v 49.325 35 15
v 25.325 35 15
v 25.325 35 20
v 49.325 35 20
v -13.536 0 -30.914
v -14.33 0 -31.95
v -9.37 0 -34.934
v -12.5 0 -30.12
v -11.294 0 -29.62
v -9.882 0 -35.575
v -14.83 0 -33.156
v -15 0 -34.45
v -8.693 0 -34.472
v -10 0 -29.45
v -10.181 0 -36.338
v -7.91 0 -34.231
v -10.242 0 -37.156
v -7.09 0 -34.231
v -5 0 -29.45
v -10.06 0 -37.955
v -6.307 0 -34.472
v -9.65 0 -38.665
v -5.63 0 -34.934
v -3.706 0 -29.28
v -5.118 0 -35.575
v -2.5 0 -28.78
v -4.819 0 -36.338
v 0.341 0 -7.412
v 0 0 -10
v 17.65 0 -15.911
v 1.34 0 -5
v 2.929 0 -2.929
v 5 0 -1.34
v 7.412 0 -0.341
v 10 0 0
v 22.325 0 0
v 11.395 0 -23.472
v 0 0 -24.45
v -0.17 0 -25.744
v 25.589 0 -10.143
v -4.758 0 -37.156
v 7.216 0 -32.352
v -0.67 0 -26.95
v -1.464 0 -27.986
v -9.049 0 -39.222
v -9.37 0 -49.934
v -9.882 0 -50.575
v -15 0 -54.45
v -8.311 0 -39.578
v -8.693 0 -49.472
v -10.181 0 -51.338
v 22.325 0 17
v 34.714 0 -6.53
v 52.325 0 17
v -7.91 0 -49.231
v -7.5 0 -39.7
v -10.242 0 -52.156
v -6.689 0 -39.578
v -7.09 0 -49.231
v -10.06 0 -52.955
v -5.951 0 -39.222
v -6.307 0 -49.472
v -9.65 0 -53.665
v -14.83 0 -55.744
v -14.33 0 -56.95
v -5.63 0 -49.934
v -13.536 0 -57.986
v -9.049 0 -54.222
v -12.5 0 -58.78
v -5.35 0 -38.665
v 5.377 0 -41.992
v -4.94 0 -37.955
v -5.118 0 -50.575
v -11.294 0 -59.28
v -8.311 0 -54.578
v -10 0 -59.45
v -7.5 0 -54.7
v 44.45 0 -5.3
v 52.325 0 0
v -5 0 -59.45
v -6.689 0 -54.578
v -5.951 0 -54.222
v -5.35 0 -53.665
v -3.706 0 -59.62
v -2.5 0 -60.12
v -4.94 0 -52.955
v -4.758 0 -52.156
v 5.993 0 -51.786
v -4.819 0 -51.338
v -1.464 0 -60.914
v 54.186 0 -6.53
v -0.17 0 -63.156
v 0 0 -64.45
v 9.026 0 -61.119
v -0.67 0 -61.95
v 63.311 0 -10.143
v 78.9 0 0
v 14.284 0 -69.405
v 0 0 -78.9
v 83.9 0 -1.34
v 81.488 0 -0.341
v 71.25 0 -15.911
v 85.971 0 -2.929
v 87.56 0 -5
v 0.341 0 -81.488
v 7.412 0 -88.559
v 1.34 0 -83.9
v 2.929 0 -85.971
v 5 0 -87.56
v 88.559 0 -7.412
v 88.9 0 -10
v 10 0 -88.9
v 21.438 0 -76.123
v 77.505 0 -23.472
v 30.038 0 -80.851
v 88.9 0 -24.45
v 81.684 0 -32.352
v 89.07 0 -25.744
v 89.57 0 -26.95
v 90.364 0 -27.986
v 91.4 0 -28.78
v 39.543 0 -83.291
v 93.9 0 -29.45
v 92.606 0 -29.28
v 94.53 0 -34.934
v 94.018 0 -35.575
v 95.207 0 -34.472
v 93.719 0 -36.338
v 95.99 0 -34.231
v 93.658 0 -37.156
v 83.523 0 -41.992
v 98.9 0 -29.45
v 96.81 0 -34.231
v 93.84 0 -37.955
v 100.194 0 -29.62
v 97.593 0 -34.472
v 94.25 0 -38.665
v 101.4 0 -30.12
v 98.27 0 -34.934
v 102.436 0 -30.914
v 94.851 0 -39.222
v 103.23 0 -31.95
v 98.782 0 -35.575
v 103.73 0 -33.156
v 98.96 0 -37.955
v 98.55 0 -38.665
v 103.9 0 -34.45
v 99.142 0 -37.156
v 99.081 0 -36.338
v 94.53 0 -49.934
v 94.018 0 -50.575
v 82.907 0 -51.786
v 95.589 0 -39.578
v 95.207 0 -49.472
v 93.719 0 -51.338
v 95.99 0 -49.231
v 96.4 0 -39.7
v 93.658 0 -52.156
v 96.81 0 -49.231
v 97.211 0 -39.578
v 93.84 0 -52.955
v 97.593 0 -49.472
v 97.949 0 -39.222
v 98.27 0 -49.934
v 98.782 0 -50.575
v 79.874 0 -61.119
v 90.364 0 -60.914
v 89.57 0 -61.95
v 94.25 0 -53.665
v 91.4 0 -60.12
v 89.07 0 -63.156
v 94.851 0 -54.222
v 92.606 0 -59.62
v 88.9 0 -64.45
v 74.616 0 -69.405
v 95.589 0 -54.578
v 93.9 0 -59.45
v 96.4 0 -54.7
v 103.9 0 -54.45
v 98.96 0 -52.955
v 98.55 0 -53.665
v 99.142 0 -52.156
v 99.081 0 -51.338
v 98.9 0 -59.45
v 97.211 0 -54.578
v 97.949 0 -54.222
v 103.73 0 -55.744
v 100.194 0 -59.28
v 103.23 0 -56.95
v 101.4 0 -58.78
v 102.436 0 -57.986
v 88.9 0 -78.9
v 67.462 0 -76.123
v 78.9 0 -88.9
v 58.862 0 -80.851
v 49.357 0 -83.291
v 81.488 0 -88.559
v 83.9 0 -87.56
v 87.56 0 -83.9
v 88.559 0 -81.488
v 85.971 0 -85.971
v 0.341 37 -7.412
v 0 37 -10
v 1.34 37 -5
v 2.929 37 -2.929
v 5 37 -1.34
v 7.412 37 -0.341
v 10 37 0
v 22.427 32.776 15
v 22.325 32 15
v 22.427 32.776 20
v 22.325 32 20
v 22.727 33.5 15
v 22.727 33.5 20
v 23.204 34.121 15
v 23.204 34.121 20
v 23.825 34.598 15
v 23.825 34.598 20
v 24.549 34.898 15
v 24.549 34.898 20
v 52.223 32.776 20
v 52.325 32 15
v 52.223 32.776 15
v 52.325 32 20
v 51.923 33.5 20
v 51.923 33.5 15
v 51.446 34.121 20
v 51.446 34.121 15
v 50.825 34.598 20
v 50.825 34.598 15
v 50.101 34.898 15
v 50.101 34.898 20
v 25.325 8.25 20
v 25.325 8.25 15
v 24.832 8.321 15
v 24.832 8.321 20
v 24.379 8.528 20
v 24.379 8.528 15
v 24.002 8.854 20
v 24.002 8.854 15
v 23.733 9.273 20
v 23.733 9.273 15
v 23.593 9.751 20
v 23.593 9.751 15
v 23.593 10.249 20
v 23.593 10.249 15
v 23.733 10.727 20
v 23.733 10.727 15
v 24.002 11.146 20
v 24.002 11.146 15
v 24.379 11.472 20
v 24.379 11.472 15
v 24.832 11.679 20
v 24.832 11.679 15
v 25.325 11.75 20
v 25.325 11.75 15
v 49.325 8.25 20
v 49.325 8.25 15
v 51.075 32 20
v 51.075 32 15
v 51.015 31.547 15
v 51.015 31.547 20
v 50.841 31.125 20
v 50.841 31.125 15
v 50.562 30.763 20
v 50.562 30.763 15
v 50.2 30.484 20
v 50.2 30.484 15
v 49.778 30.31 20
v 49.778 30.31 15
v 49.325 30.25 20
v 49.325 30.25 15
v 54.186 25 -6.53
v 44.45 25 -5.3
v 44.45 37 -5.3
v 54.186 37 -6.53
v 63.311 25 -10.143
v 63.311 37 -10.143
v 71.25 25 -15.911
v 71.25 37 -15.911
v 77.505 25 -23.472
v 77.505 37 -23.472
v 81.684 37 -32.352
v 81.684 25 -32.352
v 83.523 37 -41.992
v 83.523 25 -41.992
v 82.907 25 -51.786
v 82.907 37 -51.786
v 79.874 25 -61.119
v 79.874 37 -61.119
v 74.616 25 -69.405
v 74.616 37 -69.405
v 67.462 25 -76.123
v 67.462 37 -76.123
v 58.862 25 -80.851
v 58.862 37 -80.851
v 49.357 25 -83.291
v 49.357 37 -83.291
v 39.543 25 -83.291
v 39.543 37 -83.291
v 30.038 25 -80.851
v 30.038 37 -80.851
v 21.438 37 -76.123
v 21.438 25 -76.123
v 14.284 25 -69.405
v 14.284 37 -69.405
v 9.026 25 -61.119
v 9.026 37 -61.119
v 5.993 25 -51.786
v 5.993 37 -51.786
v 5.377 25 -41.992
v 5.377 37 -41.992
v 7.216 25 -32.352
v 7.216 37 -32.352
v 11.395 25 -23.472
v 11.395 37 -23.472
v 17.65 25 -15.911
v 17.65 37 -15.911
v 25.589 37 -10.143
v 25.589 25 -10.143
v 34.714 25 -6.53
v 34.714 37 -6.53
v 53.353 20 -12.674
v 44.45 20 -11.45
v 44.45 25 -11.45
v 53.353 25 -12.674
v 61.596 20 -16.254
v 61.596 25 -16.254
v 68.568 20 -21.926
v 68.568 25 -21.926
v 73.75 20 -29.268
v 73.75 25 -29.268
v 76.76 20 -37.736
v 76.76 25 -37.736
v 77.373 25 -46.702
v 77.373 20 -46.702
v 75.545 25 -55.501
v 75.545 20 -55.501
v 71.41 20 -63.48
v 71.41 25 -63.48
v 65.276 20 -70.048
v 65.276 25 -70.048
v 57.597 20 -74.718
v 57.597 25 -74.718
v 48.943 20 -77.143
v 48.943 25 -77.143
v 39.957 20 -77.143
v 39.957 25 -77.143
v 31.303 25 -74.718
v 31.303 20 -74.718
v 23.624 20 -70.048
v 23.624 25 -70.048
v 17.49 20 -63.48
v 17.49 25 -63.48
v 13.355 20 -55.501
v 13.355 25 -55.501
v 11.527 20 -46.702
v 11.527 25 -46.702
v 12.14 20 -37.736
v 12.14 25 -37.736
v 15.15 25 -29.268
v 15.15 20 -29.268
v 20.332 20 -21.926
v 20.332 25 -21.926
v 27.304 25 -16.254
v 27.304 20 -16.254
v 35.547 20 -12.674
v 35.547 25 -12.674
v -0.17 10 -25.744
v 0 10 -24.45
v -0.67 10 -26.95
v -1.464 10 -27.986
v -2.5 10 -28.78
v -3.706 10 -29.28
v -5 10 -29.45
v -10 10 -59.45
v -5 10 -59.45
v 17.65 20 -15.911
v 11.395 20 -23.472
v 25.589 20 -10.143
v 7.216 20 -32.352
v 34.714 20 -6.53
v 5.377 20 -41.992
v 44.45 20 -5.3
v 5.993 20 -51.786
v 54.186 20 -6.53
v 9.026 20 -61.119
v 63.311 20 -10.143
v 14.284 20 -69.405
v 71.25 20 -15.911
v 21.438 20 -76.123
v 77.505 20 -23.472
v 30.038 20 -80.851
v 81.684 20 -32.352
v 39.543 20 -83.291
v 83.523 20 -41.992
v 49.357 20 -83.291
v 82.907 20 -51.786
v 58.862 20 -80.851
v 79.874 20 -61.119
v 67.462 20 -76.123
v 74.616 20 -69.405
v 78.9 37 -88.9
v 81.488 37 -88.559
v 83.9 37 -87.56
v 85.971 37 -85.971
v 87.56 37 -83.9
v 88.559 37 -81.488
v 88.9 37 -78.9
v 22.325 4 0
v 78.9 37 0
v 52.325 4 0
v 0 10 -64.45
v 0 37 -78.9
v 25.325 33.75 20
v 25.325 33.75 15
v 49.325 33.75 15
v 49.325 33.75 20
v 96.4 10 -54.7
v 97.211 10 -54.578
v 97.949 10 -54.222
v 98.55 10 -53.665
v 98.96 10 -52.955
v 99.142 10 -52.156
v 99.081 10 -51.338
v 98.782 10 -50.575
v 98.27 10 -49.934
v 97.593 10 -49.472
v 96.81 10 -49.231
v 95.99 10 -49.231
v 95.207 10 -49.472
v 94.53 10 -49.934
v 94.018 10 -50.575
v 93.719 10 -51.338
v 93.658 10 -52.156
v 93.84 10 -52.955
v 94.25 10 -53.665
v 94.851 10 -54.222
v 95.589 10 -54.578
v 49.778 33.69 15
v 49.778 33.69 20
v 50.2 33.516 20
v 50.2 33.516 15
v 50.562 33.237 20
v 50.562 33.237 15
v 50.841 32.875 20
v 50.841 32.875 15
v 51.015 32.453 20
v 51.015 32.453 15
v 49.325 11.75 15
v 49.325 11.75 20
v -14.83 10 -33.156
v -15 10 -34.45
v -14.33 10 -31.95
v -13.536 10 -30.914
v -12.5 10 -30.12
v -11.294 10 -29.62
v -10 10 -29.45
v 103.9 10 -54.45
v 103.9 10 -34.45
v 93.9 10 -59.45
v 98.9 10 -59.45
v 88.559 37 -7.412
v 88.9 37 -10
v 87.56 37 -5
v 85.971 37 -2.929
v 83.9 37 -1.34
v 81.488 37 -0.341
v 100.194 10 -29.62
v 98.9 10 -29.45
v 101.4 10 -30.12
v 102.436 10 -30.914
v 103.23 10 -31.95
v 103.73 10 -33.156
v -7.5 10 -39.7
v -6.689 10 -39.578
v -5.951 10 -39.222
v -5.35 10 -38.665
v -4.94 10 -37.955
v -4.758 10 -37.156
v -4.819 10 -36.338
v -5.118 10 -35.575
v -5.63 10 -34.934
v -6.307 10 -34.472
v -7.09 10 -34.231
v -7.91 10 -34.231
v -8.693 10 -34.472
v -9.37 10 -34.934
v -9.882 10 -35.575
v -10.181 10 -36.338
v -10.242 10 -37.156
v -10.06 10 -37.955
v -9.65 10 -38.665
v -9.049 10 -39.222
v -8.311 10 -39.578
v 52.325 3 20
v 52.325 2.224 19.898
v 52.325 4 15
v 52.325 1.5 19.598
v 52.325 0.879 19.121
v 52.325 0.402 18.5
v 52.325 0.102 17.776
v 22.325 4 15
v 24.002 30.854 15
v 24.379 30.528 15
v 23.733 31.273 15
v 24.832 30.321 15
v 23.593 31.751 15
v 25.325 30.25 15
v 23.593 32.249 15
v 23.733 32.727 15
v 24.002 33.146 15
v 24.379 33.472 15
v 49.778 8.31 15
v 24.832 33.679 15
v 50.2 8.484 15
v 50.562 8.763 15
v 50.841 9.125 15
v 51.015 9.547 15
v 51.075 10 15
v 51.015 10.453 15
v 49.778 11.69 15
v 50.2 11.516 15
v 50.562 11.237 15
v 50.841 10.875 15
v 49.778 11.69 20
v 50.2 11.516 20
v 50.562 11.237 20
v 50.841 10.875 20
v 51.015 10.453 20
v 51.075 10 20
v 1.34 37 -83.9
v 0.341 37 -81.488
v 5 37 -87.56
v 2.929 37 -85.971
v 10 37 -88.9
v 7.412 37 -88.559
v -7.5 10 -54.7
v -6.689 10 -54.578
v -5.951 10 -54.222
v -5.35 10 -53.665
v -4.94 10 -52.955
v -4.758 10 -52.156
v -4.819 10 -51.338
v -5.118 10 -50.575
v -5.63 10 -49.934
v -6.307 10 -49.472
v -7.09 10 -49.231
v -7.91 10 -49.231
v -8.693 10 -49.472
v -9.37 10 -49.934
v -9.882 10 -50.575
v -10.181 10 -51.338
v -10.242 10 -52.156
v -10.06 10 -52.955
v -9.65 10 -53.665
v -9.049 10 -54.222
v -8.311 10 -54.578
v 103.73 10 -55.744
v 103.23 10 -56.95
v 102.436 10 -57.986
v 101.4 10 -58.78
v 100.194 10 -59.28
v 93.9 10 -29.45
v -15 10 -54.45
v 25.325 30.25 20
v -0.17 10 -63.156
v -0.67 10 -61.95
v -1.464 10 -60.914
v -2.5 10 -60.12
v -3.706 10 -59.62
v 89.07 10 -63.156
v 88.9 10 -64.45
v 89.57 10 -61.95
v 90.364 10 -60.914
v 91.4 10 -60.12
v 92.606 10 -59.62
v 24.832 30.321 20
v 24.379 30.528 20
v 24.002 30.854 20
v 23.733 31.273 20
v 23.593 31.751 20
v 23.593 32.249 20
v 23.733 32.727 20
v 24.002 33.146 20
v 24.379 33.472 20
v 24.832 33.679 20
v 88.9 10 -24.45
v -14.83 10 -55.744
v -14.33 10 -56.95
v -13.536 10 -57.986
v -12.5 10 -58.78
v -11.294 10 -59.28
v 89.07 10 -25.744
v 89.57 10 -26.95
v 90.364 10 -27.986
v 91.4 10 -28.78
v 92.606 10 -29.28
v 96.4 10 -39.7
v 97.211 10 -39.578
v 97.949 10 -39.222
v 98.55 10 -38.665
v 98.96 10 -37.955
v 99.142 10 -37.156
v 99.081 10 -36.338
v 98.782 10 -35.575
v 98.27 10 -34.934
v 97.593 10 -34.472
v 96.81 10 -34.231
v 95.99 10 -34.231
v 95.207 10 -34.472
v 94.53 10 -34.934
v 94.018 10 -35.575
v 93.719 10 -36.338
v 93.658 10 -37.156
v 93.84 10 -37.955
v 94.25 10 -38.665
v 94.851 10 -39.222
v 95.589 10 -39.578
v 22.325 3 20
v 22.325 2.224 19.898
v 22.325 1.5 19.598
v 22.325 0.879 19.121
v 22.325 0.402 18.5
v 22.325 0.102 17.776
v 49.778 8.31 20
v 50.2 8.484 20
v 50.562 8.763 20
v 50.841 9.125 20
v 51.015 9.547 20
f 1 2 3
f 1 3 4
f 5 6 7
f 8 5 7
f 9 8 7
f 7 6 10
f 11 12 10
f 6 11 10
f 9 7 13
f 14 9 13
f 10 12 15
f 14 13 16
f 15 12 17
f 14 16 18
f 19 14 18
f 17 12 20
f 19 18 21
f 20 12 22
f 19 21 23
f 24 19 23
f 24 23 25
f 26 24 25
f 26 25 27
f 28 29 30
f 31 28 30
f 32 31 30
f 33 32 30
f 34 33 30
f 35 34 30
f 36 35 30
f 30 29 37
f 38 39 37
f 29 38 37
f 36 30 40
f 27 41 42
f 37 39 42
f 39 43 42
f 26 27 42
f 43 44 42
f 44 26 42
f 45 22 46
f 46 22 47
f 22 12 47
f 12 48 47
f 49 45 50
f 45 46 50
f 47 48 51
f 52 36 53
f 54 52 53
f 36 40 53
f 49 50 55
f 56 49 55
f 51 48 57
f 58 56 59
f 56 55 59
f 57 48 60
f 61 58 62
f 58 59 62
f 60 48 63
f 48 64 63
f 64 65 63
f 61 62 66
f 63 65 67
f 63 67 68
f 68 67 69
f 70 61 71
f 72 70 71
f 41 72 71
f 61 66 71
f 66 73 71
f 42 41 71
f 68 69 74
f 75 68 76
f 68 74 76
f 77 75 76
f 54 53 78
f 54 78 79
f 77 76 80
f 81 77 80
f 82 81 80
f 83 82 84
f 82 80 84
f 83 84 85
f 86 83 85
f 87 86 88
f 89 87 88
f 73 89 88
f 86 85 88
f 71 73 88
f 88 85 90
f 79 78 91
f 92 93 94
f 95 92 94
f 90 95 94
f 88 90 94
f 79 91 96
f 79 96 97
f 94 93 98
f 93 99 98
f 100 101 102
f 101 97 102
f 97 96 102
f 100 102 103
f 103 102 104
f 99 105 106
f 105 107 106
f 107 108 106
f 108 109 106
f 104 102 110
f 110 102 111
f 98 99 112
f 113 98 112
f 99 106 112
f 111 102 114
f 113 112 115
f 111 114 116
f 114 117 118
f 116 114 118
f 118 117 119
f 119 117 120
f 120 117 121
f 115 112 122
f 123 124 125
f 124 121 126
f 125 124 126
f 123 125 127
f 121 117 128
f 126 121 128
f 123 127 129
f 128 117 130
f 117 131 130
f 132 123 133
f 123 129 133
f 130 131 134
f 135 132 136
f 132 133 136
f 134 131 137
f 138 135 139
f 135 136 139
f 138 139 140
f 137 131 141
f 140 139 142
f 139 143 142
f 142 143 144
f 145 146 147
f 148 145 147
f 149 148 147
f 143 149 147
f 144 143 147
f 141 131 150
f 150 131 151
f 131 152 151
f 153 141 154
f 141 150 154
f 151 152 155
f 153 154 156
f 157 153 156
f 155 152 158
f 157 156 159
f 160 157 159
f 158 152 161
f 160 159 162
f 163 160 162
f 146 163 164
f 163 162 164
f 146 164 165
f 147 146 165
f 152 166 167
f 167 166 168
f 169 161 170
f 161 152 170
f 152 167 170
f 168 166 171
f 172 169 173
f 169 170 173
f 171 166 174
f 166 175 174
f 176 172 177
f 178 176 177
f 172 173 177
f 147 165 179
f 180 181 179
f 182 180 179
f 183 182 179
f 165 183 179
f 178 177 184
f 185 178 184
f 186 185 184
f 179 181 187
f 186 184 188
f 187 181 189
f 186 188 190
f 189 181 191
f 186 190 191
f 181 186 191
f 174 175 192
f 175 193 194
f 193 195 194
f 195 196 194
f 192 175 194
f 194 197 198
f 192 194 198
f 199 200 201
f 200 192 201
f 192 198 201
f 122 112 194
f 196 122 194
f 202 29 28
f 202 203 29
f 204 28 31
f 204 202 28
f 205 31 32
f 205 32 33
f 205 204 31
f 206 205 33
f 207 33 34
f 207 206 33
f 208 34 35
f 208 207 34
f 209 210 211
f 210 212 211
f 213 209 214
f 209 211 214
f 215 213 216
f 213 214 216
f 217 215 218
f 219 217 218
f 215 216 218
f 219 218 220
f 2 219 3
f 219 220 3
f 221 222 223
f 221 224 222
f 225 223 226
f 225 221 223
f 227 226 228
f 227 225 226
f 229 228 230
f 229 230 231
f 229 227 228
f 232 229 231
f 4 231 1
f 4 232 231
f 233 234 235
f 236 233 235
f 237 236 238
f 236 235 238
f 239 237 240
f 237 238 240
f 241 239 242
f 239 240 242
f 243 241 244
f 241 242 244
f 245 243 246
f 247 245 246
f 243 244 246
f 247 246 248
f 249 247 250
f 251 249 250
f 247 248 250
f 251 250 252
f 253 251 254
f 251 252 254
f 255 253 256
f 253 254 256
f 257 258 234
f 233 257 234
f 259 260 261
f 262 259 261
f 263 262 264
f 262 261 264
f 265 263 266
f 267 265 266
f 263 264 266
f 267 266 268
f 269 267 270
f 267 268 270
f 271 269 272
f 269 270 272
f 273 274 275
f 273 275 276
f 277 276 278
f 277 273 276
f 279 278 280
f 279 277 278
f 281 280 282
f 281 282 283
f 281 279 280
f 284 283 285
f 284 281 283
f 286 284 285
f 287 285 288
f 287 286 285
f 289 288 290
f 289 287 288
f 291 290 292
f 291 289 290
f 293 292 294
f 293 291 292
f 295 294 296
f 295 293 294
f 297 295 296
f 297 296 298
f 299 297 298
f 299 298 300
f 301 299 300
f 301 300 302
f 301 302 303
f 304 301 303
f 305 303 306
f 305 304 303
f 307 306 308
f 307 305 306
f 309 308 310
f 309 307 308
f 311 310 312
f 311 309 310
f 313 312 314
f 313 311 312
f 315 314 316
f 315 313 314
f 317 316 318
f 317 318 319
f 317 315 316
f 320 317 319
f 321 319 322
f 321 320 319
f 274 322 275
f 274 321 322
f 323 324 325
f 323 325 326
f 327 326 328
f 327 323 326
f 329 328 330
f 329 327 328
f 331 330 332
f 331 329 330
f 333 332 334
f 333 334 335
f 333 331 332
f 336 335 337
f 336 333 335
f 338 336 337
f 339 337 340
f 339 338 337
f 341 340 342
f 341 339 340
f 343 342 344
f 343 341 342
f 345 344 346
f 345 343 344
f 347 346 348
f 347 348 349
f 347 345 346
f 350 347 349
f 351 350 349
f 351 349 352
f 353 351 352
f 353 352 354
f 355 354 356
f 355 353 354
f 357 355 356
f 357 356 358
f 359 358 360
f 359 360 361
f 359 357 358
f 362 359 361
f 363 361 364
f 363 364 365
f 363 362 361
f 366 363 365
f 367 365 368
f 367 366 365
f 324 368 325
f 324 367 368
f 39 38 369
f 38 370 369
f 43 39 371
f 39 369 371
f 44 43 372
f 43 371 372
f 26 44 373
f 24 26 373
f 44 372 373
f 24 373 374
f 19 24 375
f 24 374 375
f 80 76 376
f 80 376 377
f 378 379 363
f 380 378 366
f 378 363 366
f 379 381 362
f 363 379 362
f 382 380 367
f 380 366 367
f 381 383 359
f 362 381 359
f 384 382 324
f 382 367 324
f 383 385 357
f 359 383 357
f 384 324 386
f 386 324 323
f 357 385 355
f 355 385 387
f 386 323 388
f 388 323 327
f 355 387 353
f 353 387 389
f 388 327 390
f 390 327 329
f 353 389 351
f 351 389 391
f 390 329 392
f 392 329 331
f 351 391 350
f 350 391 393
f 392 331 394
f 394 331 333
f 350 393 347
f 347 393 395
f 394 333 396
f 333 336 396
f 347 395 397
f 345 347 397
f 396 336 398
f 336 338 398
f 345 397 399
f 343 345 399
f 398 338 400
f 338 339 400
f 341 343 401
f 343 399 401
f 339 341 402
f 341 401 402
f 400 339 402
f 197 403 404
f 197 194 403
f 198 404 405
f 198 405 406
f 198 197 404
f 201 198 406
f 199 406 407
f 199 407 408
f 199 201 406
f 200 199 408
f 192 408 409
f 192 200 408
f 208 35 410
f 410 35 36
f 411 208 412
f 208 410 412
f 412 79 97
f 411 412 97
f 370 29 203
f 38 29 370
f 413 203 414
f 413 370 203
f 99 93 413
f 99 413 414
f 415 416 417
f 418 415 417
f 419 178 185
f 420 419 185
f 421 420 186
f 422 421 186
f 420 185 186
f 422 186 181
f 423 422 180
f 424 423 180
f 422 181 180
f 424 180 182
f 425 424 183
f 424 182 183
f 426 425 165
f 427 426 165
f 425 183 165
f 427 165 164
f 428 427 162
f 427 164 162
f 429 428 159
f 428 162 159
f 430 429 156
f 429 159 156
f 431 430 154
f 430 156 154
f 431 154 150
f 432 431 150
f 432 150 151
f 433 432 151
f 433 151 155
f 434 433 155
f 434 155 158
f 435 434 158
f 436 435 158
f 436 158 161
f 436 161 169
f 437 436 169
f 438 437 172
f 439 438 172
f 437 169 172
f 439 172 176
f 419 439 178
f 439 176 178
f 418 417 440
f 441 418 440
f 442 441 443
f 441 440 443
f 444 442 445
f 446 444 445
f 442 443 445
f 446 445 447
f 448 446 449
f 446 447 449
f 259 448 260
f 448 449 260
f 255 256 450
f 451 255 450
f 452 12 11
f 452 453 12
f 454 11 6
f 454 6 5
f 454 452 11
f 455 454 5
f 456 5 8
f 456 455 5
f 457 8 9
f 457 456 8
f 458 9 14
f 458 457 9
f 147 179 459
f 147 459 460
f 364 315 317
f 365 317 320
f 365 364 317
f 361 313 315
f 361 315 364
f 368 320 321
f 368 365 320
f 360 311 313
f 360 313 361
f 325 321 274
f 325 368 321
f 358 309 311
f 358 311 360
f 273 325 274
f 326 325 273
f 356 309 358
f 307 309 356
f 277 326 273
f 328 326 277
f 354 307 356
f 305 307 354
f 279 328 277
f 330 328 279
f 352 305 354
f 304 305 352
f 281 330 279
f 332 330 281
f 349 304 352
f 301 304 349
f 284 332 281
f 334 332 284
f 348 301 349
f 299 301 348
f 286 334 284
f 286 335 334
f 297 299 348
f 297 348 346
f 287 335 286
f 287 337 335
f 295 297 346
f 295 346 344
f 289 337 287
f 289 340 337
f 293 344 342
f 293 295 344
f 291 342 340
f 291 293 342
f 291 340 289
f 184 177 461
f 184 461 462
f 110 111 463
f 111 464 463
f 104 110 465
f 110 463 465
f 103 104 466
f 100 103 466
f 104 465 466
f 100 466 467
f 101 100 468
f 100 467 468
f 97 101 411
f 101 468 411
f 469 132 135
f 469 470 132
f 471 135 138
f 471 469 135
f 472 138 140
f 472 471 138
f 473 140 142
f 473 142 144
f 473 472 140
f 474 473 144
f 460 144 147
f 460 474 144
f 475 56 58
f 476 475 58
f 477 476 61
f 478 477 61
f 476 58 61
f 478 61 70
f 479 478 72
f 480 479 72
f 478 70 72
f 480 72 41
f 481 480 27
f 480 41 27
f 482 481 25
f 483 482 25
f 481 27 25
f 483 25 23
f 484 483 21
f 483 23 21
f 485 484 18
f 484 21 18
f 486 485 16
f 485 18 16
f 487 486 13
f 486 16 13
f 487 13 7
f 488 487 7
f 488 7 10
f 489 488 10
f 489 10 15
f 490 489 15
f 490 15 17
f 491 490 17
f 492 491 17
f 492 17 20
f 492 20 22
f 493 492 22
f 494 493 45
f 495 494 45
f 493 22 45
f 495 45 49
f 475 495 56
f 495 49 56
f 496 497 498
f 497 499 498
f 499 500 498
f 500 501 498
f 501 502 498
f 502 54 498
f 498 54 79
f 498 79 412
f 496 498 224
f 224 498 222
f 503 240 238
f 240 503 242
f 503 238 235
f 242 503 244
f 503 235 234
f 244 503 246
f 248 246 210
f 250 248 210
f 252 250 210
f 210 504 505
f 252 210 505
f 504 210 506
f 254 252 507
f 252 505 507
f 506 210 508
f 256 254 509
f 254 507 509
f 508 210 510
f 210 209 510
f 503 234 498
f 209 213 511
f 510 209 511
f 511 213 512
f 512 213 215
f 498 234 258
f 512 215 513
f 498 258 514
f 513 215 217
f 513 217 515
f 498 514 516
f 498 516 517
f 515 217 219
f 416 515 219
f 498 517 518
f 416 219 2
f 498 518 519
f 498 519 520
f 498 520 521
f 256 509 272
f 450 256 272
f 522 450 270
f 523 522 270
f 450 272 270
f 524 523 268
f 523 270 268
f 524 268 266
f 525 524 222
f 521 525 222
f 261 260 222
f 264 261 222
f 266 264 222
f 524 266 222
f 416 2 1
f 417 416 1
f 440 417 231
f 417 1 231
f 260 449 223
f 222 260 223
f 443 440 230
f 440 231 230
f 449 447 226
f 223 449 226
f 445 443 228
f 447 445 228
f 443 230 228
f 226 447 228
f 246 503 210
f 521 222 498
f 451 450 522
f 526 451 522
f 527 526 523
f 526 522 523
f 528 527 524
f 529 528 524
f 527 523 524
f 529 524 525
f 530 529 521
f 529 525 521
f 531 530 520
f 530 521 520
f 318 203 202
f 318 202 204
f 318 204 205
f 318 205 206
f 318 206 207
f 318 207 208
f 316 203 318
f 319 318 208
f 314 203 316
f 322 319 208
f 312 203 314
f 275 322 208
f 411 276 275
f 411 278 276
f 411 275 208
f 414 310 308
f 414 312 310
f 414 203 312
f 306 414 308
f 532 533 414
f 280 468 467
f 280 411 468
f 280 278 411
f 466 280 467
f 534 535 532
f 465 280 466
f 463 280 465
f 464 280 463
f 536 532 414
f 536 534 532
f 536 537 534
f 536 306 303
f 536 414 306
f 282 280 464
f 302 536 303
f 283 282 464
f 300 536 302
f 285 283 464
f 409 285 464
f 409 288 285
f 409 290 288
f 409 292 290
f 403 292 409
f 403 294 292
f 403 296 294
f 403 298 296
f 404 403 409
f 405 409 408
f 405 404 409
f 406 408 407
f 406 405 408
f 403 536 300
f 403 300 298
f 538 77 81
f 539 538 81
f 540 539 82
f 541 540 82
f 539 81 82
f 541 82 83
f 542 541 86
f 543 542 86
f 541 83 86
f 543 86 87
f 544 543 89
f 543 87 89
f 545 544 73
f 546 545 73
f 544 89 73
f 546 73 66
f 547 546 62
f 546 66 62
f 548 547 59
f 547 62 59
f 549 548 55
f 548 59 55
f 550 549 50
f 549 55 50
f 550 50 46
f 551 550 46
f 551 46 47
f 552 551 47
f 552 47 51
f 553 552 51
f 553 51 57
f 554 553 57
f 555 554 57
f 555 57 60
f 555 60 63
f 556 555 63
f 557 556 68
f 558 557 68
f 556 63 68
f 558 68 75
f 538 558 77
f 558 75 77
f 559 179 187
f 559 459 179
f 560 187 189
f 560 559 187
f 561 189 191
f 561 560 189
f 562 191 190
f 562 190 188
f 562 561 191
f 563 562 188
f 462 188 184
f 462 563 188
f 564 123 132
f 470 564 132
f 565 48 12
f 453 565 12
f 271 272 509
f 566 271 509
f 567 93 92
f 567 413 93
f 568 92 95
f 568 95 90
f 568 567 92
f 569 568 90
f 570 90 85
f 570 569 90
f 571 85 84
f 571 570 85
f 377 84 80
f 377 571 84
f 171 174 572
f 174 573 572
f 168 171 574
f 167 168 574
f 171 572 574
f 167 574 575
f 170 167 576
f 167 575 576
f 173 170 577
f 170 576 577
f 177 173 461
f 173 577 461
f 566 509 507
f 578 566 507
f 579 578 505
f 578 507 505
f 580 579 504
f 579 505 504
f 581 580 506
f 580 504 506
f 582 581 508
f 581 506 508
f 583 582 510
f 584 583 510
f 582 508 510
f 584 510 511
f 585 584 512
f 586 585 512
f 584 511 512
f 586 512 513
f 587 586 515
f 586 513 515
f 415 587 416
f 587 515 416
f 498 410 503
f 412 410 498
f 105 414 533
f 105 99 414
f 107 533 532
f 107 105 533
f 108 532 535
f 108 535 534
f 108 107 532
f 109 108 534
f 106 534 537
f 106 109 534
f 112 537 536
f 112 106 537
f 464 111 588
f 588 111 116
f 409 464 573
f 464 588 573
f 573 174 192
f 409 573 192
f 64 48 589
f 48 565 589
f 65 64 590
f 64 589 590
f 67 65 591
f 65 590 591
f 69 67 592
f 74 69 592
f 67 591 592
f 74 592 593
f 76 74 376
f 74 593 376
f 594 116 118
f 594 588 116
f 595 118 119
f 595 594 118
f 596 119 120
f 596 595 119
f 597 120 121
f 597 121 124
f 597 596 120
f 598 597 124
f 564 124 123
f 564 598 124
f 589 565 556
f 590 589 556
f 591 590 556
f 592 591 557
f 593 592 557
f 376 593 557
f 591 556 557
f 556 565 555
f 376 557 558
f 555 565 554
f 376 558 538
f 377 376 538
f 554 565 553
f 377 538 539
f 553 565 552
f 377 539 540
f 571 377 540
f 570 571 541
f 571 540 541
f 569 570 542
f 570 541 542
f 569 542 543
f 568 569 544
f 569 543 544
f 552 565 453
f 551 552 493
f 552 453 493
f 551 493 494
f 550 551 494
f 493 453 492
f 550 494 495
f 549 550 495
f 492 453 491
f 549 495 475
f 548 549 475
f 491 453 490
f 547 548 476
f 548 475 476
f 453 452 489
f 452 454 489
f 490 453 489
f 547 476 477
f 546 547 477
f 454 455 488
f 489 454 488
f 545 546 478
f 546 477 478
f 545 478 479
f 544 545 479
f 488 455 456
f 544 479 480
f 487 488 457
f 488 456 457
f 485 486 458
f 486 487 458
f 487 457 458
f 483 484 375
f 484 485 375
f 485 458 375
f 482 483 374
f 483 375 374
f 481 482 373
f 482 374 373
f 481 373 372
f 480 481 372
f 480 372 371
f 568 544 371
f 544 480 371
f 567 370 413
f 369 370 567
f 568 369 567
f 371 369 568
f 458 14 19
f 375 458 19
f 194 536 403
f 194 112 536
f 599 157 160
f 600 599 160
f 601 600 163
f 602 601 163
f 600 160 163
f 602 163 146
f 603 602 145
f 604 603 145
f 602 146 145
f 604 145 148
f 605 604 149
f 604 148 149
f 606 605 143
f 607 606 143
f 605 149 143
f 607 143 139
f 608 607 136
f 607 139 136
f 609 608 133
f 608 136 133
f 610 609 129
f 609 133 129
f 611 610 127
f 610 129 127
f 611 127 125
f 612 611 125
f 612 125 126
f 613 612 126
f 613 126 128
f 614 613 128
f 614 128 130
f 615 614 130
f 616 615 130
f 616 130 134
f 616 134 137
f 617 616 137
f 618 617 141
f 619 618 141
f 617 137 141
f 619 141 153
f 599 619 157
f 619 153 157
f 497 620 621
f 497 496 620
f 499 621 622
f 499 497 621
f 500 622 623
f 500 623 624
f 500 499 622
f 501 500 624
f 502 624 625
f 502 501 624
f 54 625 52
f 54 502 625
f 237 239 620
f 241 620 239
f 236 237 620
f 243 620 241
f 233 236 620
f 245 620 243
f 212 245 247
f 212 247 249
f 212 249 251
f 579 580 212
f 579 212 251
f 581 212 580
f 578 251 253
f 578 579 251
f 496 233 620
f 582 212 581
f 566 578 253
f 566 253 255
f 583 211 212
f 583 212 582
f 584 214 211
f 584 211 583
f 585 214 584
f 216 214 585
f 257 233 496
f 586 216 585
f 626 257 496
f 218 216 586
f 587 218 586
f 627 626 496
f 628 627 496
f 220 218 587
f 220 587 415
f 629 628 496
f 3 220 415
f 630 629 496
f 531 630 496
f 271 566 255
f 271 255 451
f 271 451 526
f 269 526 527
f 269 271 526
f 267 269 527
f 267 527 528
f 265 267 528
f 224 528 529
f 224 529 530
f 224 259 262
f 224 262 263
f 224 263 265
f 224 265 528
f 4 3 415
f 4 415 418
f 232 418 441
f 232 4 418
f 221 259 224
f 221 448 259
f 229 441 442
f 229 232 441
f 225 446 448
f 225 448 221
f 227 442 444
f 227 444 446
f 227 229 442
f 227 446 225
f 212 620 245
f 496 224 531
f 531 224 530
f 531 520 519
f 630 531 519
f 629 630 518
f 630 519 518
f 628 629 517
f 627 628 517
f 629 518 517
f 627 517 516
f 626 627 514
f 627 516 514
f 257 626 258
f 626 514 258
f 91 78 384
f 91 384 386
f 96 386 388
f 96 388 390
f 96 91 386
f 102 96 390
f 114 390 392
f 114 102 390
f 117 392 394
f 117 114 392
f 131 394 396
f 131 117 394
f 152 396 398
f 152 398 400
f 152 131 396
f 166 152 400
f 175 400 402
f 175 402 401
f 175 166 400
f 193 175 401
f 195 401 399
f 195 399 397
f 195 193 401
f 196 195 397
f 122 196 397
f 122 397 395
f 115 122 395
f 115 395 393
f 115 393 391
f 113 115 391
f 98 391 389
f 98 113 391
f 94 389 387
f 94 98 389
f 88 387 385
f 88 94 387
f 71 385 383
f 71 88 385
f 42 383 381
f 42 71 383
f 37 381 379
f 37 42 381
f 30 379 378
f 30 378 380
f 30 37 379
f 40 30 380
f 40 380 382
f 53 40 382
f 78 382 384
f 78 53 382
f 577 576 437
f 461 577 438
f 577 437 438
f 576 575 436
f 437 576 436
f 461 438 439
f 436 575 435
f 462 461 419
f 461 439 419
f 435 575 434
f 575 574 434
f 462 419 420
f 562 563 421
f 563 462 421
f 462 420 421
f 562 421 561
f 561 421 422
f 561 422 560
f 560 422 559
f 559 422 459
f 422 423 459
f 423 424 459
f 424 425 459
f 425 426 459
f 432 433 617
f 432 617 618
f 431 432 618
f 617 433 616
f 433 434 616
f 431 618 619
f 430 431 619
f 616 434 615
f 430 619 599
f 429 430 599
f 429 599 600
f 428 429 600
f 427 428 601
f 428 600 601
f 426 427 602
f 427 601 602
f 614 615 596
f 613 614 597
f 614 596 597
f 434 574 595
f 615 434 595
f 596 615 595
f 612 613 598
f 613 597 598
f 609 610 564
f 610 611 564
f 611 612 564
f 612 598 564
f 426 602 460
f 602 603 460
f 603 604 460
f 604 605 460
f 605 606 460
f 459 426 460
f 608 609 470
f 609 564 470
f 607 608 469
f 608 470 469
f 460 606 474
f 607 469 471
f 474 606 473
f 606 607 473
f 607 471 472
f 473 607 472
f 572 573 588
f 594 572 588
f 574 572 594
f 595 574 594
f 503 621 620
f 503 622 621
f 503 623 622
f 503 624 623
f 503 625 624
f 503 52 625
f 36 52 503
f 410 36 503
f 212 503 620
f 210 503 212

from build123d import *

# Parameters (mm, degrees)
SKETCH1_W           = 88.9
SKETCH1_H           = 88.9
SKETCH1_R           = 39.15
BOSS_EXTRUDE1_DEPTH = 20
SKETCH2_W           = 88.9
SKETCH2_H           = 88.9
SKETCH2_R           = 33
BOSS_EXTRUDE3_DEPTH = 5
SKETCH3_W           = 88.9
SKETCH3_H           = 88.9
SKETCH3_R           = 39.15
BOSS_EXTRUDE4_DEPTH = 12
SKETCH4_W           = 15
SKETCH4_H           = 15
SKETCH4_R           = 2.75
BOSS_EXTRUDE5_DEPTH = 10
FILLET1_R           = 5
FILLET2_R           = 10
SKETCH5_W           = 30
SKETCH5_H           = 4
BOSS_EXTRUDE6_DEPTH = 15
SKETCH6_W           = 30
SKETCH6_H           = 31
SKETCH6_H_2         = 4
BOSS_EXTRUDE7_DEPTH = 5
FILLET3_R           = 3


with BuildPart() as part:
    # Sketch1 → Boss-Extrude1 (new body)
    with BuildSketch(Plane(origin=(0, 0, 0), x_dir=(1, 0, 0), z_dir=(0, 1, 0))):
        with Locations((44.45, 44.45)):
            Rectangle(SKETCH1_W, SKETCH1_H)
        with Locations(Location((44.45, 44.45, 0), (0, 0, 270))):
            Circle(SKETCH1_R, mode=Mode.SUBTRACT)
    extrude(amount=BOSS_EXTRUDE1_DEPTH)

    # Sketch2 → Boss-Extrude3 (add)
    with BuildSketch(Plane(origin=(0, 20, 0), x_dir=(1, 0, 0), z_dir=(0, 1, 0))):
        with Locations((44.45, 44.45)):
            Rectangle(SKETCH2_W, SKETCH2_H)
        with Locations(Location((44.45, 44.45, 0), (0, 0, 270))):
            Circle(SKETCH2_R, mode=Mode.SUBTRACT)
    extrude(amount=BOSS_EXTRUDE3_DEPTH)

    # Sketch3 → Boss-Extrude4 (add)
    with BuildSketch(Plane(origin=(0, 25, 0), x_dir=(1, 0, 0), z_dir=(0, 1, 0))):
        with Locations((44.45, 44.45)):
            Rectangle(SKETCH3_W, SKETCH3_H)
        with Locations(Location((44.45, 44.45, 0), (0, 0, 270))):
            Circle(SKETCH3_R, mode=Mode.SUBTRACT)
    extrude(amount=BOSS_EXTRUDE4_DEPTH)

    # Sketch4 → Boss-Extrude5 (add)
    # profile 1 of 4: a face of its own
    with BuildSketch(Plane.XZ):
        with Locations((-7.5, -36.95)):
            Rectangle(SKETCH4_W, SKETCH4_H)
        with Locations(Location((-7.5, -36.95, 0), (0, 0, 270))):
            Circle(SKETCH4_R, mode=Mode.SUBTRACT)
    # profile 2 of 4: a face of its own
    with BuildSketch(Plane.XZ):
        with Locations((-7.5, -51.95)):
            Rectangle(SKETCH4_W, SKETCH4_H)
        with Locations(Location((-7.5, -51.95, 0), (0, 0, 270))):
            Circle(SKETCH4_R, mode=Mode.SUBTRACT)
    # profile 3 of 4: a face of its own
    with BuildSketch(Plane.XZ):
        with Locations((96.4, -36.95)):
            Rectangle(SKETCH4_W, SKETCH4_H)
        with Locations(Location((96.4, -36.95, 0), (0, 0, 270))):
            Circle(SKETCH4_R, mode=Mode.SUBTRACT)
    # profile 4 of 4: a face of its own
    with BuildSketch(Plane.XZ):
        with Locations((96.4, -51.95)):
            Rectangle(SKETCH4_W, SKETCH4_H)
        with Locations(Location((96.4, -51.95, 0), (0, 0, 270))):
            Circle(SKETCH4_R, mode=Mode.SUBTRACT)
    extrude(amount=-BOSS_EXTRUDE5_DEPTH)

    # Fillet1
    fillet1_edges = [part.edges().sort_by_distance(p)[0] for p in [
        (-15, 5, -59.45),
        (-15, 5, -29.45),
        (0, 5, -29.45),
        (0, 5, -59.45),
        (88.9, 5, -59.45),
        (88.9, 5, -29.45),
        (103.9, 5, -29.45),
        (103.9, 5, -59.45),
    ]]
    fillet(fillet1_edges, radius=FILLET1_R)

    # Fillet2
    fillet2_edges = [part.edges().sort_by_distance(p)[0] for p in [
        (0, 18.5, 0),
        (0, 18.5, -88.9),
        (88.9, 18.5, -88.9),
        (88.9, 18.5, 0),
    ]]
    fillet(fillet2_edges, radius=FILLET2_R)

    # Sketch5 → Boss-Extrude6 (add)
    with BuildSketch(Plane.XY):
        with Locations((37.32503103, 2)):
            Rectangle(SKETCH5_W, SKETCH5_H)
    extrude(amount=BOSS_EXTRUDE6_DEPTH)

    # Sketch6 → Boss-Extrude7 (add)
    # profile 1 of 2: a face of its own
    with BuildSketch(Plane.XY.offset(15)):
        with Locations((37.32503103, 19.5)):
            Rectangle(SKETCH6_W, SKETCH6_H)
        with BuildLine():
            ThreePointArc((25.32503103, 8.25), (23.57503103, 10), (25.32503103, 11.75))
            Line((25.32503103, 11.75), (49.32503103, 11.75))
            ThreePointArc((49.32503103, 11.75), (50.562467897, 11.237436867), (51.07503103, 10))
            ThreePointArc((51.07503103, 10), (50.562467897, 8.762563133), (49.32503103, 8.25))
            Line((49.32503103, 8.25), (25.32503103, 8.25))
        make_face(mode=Mode.SUBTRACT)
        with BuildLine():
            ThreePointArc((25.32503103, 30.25), (23.57503103, 32), (25.32503103, 33.75))
            Line((25.32503103, 33.75), (49.32503103, 33.75))
            ThreePointArc((49.32503103, 33.75), (50.562467897, 33.237436867), (51.07503103, 32))
            ThreePointArc((51.07503103, 32), (50.562467897, 30.762563133), (49.32503103, 30.25))
            Line((49.32503103, 30.25), (25.32503103, 30.25))
        make_face(mode=Mode.SUBTRACT)
    # profile 2 of 2: a face of its own
    with BuildSketch(Plane.XY.offset(15)):
        with Locations((37.32503103, 2)):
            Rectangle(SKETCH6_W, SKETCH6_H_2)
    extrude(amount=BOSS_EXTRUDE7_DEPTH)

    # Fillet3
    fillet3_edges = [part.edges().sort_by_distance(p)[0] for p in [
        (22.32503103, 35, 17.5),
        (52.32503103, 35, 17.5),
        (37.32503103, 0, 20),
    ]]
    fillet(fillet3_edges, radius=FILLET3_R)


solid = part.part
